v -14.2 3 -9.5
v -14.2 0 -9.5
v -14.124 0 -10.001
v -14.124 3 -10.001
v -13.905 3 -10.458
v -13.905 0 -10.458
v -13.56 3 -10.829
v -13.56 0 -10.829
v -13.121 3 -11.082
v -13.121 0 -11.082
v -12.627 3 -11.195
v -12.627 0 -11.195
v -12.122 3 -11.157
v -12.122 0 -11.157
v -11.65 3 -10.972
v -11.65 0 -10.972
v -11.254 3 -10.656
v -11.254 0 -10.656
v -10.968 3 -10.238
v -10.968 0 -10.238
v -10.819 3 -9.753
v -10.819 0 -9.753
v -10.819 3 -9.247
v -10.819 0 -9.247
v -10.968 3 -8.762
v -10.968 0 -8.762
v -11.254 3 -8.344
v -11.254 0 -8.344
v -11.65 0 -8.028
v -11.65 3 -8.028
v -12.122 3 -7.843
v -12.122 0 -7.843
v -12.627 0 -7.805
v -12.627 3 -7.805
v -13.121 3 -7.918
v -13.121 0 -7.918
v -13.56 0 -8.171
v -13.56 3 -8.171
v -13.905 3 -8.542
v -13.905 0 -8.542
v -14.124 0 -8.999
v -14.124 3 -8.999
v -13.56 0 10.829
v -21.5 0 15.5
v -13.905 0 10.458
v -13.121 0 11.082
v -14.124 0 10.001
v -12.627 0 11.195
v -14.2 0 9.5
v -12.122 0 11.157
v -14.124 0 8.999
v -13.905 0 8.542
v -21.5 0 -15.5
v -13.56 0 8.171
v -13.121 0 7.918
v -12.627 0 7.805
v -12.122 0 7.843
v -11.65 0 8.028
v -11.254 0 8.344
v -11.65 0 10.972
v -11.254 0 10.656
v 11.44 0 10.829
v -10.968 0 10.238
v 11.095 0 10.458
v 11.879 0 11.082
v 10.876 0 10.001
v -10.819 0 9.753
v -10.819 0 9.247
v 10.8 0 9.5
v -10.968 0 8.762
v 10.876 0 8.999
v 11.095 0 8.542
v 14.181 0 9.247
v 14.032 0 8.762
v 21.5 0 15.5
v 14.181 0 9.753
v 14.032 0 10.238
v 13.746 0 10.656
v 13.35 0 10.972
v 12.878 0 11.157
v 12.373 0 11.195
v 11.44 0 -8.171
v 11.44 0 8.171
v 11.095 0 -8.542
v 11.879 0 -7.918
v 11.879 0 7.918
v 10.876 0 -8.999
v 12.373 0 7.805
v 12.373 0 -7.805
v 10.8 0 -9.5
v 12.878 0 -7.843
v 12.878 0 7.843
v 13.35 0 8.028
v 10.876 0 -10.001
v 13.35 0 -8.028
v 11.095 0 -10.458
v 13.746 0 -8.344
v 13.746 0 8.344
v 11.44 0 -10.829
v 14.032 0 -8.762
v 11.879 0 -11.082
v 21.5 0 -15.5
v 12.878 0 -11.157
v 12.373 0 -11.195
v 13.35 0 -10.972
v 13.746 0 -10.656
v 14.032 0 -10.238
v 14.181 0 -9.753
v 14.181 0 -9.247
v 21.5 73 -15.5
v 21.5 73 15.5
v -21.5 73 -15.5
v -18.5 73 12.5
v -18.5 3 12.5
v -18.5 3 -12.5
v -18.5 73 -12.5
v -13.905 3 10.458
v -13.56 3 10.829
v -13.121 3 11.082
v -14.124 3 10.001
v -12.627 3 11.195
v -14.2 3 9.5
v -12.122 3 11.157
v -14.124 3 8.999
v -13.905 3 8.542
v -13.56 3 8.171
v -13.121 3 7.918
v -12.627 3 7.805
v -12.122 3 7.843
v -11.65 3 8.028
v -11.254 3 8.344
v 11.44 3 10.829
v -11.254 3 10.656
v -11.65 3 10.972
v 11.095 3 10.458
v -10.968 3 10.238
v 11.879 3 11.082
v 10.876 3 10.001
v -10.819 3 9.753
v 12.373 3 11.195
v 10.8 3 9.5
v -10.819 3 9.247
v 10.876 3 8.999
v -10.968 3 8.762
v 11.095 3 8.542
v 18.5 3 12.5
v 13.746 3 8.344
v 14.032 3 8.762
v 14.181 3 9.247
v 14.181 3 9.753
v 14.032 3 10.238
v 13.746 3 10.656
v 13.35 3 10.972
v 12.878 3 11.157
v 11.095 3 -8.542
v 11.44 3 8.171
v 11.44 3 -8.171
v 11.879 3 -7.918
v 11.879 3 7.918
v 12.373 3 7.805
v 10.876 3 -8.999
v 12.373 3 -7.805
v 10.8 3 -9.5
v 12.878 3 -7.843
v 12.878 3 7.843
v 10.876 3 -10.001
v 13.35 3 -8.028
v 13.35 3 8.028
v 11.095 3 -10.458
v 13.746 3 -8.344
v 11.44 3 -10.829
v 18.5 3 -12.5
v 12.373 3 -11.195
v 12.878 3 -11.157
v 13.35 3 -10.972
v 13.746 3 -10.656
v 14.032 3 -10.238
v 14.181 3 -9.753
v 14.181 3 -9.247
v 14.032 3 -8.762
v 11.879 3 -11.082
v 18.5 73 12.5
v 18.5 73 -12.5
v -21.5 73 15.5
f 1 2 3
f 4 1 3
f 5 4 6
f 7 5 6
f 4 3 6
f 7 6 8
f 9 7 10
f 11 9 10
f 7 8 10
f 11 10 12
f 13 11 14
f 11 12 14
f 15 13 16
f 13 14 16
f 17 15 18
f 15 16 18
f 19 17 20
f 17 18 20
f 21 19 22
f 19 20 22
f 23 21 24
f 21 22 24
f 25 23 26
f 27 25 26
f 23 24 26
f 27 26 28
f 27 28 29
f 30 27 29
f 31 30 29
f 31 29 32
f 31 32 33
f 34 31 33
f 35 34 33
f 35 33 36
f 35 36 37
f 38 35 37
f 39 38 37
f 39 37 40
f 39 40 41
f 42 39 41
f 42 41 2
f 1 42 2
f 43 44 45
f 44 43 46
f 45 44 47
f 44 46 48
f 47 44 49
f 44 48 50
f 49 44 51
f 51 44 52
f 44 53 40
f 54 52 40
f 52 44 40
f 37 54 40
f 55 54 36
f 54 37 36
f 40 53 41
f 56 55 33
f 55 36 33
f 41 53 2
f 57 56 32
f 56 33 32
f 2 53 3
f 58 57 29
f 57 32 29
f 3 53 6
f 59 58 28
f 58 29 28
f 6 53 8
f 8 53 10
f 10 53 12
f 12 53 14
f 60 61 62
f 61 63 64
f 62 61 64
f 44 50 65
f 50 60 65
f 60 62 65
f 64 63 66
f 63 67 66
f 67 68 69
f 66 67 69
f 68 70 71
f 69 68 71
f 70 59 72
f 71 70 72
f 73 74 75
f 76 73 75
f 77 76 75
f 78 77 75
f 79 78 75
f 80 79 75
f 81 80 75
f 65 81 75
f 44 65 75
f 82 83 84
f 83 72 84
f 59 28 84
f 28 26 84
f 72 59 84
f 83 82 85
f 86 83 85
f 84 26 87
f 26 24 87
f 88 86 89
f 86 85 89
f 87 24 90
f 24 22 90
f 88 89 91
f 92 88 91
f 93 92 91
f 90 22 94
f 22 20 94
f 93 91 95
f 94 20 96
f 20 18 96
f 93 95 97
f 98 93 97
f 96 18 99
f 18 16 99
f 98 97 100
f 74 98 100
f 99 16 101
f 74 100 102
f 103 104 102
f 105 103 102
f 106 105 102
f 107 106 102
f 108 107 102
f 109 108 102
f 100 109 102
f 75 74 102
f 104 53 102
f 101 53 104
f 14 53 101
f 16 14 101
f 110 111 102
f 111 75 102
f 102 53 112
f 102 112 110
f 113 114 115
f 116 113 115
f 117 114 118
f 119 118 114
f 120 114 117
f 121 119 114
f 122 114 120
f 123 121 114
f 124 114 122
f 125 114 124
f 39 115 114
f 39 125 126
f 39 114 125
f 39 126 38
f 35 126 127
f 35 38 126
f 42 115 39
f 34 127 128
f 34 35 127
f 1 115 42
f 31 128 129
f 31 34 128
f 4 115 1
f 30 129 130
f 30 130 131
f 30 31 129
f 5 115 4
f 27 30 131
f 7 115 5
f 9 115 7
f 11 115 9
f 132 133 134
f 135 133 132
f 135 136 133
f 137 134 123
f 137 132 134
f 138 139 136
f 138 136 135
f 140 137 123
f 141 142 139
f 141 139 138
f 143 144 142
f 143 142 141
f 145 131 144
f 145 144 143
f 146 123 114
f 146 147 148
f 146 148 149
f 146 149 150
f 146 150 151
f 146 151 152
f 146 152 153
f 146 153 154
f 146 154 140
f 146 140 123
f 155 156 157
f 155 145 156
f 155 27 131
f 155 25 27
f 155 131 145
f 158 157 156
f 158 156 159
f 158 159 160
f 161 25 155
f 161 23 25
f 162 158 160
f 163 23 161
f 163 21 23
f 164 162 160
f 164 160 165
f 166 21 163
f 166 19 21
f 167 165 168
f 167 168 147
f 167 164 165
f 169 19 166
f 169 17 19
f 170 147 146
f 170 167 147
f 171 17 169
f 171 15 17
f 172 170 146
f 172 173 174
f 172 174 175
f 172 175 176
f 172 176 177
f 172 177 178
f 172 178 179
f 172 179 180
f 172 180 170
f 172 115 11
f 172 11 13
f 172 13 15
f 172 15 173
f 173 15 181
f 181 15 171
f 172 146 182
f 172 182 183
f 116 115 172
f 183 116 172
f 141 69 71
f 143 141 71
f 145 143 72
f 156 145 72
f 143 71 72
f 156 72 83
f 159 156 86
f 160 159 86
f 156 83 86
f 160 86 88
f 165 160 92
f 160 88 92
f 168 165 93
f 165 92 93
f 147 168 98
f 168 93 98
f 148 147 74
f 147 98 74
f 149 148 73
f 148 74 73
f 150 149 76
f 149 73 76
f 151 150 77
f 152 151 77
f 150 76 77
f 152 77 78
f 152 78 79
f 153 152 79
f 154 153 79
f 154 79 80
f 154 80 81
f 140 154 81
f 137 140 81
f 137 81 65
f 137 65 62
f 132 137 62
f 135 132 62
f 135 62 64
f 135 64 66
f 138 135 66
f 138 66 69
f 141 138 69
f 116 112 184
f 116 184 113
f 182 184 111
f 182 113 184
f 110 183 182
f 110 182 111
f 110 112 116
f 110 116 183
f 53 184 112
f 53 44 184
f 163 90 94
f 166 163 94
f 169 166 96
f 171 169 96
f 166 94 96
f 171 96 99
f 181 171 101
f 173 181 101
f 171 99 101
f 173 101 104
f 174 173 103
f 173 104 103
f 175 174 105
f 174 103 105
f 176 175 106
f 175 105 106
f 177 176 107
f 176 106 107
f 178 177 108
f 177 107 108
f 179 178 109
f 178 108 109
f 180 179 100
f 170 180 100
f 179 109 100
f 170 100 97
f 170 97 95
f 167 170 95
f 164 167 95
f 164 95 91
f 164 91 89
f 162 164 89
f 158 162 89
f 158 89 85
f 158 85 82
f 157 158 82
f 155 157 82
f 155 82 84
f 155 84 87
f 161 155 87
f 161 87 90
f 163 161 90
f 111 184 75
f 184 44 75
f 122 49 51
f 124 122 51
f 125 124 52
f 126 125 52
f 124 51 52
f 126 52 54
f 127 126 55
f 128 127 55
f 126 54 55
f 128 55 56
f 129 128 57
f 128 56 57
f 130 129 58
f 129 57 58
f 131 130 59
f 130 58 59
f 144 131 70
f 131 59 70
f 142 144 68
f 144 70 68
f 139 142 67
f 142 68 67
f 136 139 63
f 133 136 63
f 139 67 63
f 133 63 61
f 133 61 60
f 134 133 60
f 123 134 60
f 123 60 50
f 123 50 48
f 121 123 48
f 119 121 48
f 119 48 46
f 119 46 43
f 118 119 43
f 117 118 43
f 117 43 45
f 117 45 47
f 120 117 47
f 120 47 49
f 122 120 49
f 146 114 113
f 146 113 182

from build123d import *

# Parameters (mm, degrees)
SKETCH1_W            = 43
SKETCH1_H            = 31
BOSS_EXTRUDE1_DEPTH  = 3
BOSS_EXTRUDE2_START  = 3
SKETCH1_3_W          = 43
SKETCH1_3_H          = 31
SKETCH1_3_W_2        = 37
SKETCH1_3_H_2        = 25
BOSS_EXTRUDE2_DEPTH  = 70
M3_CLEARANCE_HOLE1_D = 3.4


with BuildPart() as part:
    # Sketch1 → Boss-Extrude1 (new body)
    with BuildSketch(Plane(origin=(0, 0, 0), x_dir=(1, 0, 0), z_dir=(0, 1, 0))):
        Rectangle(SKETCH1_W, SKETCH1_H)
    extrude(amount=BOSS_EXTRUDE1_DEPTH)

    # Sketch1<3> → Boss-Extrude2 (add)
    with BuildSketch(Plane(origin=(0, 0, 0), x_dir=(1, 0, 0), z_dir=(0, 1, 0)).offset(BOSS_EXTRUDE2_START)):
        Rectangle(SKETCH1_3_W, SKETCH1_3_H)
        Rectangle(SKETCH1_3_W_2, SKETCH1_3_H_2, mode=Mode.SUBTRACT)
    extrude(amount=BOSS_EXTRUDE2_DEPTH)

    # M3 Clearance Hole1 (through all)
    with Locations(Plane(origin=(0, 3, 0), x_dir=(1, 0, 0), z_dir=(0, 1, 0))):
        with Locations((-12.5, 9.5), (12.5, 9.5), (12.5, -9.5), (-12.5, -9.5)):
            Hole(M3_CLEARANCE_HOLE1_D / 2)


solid = part.part
